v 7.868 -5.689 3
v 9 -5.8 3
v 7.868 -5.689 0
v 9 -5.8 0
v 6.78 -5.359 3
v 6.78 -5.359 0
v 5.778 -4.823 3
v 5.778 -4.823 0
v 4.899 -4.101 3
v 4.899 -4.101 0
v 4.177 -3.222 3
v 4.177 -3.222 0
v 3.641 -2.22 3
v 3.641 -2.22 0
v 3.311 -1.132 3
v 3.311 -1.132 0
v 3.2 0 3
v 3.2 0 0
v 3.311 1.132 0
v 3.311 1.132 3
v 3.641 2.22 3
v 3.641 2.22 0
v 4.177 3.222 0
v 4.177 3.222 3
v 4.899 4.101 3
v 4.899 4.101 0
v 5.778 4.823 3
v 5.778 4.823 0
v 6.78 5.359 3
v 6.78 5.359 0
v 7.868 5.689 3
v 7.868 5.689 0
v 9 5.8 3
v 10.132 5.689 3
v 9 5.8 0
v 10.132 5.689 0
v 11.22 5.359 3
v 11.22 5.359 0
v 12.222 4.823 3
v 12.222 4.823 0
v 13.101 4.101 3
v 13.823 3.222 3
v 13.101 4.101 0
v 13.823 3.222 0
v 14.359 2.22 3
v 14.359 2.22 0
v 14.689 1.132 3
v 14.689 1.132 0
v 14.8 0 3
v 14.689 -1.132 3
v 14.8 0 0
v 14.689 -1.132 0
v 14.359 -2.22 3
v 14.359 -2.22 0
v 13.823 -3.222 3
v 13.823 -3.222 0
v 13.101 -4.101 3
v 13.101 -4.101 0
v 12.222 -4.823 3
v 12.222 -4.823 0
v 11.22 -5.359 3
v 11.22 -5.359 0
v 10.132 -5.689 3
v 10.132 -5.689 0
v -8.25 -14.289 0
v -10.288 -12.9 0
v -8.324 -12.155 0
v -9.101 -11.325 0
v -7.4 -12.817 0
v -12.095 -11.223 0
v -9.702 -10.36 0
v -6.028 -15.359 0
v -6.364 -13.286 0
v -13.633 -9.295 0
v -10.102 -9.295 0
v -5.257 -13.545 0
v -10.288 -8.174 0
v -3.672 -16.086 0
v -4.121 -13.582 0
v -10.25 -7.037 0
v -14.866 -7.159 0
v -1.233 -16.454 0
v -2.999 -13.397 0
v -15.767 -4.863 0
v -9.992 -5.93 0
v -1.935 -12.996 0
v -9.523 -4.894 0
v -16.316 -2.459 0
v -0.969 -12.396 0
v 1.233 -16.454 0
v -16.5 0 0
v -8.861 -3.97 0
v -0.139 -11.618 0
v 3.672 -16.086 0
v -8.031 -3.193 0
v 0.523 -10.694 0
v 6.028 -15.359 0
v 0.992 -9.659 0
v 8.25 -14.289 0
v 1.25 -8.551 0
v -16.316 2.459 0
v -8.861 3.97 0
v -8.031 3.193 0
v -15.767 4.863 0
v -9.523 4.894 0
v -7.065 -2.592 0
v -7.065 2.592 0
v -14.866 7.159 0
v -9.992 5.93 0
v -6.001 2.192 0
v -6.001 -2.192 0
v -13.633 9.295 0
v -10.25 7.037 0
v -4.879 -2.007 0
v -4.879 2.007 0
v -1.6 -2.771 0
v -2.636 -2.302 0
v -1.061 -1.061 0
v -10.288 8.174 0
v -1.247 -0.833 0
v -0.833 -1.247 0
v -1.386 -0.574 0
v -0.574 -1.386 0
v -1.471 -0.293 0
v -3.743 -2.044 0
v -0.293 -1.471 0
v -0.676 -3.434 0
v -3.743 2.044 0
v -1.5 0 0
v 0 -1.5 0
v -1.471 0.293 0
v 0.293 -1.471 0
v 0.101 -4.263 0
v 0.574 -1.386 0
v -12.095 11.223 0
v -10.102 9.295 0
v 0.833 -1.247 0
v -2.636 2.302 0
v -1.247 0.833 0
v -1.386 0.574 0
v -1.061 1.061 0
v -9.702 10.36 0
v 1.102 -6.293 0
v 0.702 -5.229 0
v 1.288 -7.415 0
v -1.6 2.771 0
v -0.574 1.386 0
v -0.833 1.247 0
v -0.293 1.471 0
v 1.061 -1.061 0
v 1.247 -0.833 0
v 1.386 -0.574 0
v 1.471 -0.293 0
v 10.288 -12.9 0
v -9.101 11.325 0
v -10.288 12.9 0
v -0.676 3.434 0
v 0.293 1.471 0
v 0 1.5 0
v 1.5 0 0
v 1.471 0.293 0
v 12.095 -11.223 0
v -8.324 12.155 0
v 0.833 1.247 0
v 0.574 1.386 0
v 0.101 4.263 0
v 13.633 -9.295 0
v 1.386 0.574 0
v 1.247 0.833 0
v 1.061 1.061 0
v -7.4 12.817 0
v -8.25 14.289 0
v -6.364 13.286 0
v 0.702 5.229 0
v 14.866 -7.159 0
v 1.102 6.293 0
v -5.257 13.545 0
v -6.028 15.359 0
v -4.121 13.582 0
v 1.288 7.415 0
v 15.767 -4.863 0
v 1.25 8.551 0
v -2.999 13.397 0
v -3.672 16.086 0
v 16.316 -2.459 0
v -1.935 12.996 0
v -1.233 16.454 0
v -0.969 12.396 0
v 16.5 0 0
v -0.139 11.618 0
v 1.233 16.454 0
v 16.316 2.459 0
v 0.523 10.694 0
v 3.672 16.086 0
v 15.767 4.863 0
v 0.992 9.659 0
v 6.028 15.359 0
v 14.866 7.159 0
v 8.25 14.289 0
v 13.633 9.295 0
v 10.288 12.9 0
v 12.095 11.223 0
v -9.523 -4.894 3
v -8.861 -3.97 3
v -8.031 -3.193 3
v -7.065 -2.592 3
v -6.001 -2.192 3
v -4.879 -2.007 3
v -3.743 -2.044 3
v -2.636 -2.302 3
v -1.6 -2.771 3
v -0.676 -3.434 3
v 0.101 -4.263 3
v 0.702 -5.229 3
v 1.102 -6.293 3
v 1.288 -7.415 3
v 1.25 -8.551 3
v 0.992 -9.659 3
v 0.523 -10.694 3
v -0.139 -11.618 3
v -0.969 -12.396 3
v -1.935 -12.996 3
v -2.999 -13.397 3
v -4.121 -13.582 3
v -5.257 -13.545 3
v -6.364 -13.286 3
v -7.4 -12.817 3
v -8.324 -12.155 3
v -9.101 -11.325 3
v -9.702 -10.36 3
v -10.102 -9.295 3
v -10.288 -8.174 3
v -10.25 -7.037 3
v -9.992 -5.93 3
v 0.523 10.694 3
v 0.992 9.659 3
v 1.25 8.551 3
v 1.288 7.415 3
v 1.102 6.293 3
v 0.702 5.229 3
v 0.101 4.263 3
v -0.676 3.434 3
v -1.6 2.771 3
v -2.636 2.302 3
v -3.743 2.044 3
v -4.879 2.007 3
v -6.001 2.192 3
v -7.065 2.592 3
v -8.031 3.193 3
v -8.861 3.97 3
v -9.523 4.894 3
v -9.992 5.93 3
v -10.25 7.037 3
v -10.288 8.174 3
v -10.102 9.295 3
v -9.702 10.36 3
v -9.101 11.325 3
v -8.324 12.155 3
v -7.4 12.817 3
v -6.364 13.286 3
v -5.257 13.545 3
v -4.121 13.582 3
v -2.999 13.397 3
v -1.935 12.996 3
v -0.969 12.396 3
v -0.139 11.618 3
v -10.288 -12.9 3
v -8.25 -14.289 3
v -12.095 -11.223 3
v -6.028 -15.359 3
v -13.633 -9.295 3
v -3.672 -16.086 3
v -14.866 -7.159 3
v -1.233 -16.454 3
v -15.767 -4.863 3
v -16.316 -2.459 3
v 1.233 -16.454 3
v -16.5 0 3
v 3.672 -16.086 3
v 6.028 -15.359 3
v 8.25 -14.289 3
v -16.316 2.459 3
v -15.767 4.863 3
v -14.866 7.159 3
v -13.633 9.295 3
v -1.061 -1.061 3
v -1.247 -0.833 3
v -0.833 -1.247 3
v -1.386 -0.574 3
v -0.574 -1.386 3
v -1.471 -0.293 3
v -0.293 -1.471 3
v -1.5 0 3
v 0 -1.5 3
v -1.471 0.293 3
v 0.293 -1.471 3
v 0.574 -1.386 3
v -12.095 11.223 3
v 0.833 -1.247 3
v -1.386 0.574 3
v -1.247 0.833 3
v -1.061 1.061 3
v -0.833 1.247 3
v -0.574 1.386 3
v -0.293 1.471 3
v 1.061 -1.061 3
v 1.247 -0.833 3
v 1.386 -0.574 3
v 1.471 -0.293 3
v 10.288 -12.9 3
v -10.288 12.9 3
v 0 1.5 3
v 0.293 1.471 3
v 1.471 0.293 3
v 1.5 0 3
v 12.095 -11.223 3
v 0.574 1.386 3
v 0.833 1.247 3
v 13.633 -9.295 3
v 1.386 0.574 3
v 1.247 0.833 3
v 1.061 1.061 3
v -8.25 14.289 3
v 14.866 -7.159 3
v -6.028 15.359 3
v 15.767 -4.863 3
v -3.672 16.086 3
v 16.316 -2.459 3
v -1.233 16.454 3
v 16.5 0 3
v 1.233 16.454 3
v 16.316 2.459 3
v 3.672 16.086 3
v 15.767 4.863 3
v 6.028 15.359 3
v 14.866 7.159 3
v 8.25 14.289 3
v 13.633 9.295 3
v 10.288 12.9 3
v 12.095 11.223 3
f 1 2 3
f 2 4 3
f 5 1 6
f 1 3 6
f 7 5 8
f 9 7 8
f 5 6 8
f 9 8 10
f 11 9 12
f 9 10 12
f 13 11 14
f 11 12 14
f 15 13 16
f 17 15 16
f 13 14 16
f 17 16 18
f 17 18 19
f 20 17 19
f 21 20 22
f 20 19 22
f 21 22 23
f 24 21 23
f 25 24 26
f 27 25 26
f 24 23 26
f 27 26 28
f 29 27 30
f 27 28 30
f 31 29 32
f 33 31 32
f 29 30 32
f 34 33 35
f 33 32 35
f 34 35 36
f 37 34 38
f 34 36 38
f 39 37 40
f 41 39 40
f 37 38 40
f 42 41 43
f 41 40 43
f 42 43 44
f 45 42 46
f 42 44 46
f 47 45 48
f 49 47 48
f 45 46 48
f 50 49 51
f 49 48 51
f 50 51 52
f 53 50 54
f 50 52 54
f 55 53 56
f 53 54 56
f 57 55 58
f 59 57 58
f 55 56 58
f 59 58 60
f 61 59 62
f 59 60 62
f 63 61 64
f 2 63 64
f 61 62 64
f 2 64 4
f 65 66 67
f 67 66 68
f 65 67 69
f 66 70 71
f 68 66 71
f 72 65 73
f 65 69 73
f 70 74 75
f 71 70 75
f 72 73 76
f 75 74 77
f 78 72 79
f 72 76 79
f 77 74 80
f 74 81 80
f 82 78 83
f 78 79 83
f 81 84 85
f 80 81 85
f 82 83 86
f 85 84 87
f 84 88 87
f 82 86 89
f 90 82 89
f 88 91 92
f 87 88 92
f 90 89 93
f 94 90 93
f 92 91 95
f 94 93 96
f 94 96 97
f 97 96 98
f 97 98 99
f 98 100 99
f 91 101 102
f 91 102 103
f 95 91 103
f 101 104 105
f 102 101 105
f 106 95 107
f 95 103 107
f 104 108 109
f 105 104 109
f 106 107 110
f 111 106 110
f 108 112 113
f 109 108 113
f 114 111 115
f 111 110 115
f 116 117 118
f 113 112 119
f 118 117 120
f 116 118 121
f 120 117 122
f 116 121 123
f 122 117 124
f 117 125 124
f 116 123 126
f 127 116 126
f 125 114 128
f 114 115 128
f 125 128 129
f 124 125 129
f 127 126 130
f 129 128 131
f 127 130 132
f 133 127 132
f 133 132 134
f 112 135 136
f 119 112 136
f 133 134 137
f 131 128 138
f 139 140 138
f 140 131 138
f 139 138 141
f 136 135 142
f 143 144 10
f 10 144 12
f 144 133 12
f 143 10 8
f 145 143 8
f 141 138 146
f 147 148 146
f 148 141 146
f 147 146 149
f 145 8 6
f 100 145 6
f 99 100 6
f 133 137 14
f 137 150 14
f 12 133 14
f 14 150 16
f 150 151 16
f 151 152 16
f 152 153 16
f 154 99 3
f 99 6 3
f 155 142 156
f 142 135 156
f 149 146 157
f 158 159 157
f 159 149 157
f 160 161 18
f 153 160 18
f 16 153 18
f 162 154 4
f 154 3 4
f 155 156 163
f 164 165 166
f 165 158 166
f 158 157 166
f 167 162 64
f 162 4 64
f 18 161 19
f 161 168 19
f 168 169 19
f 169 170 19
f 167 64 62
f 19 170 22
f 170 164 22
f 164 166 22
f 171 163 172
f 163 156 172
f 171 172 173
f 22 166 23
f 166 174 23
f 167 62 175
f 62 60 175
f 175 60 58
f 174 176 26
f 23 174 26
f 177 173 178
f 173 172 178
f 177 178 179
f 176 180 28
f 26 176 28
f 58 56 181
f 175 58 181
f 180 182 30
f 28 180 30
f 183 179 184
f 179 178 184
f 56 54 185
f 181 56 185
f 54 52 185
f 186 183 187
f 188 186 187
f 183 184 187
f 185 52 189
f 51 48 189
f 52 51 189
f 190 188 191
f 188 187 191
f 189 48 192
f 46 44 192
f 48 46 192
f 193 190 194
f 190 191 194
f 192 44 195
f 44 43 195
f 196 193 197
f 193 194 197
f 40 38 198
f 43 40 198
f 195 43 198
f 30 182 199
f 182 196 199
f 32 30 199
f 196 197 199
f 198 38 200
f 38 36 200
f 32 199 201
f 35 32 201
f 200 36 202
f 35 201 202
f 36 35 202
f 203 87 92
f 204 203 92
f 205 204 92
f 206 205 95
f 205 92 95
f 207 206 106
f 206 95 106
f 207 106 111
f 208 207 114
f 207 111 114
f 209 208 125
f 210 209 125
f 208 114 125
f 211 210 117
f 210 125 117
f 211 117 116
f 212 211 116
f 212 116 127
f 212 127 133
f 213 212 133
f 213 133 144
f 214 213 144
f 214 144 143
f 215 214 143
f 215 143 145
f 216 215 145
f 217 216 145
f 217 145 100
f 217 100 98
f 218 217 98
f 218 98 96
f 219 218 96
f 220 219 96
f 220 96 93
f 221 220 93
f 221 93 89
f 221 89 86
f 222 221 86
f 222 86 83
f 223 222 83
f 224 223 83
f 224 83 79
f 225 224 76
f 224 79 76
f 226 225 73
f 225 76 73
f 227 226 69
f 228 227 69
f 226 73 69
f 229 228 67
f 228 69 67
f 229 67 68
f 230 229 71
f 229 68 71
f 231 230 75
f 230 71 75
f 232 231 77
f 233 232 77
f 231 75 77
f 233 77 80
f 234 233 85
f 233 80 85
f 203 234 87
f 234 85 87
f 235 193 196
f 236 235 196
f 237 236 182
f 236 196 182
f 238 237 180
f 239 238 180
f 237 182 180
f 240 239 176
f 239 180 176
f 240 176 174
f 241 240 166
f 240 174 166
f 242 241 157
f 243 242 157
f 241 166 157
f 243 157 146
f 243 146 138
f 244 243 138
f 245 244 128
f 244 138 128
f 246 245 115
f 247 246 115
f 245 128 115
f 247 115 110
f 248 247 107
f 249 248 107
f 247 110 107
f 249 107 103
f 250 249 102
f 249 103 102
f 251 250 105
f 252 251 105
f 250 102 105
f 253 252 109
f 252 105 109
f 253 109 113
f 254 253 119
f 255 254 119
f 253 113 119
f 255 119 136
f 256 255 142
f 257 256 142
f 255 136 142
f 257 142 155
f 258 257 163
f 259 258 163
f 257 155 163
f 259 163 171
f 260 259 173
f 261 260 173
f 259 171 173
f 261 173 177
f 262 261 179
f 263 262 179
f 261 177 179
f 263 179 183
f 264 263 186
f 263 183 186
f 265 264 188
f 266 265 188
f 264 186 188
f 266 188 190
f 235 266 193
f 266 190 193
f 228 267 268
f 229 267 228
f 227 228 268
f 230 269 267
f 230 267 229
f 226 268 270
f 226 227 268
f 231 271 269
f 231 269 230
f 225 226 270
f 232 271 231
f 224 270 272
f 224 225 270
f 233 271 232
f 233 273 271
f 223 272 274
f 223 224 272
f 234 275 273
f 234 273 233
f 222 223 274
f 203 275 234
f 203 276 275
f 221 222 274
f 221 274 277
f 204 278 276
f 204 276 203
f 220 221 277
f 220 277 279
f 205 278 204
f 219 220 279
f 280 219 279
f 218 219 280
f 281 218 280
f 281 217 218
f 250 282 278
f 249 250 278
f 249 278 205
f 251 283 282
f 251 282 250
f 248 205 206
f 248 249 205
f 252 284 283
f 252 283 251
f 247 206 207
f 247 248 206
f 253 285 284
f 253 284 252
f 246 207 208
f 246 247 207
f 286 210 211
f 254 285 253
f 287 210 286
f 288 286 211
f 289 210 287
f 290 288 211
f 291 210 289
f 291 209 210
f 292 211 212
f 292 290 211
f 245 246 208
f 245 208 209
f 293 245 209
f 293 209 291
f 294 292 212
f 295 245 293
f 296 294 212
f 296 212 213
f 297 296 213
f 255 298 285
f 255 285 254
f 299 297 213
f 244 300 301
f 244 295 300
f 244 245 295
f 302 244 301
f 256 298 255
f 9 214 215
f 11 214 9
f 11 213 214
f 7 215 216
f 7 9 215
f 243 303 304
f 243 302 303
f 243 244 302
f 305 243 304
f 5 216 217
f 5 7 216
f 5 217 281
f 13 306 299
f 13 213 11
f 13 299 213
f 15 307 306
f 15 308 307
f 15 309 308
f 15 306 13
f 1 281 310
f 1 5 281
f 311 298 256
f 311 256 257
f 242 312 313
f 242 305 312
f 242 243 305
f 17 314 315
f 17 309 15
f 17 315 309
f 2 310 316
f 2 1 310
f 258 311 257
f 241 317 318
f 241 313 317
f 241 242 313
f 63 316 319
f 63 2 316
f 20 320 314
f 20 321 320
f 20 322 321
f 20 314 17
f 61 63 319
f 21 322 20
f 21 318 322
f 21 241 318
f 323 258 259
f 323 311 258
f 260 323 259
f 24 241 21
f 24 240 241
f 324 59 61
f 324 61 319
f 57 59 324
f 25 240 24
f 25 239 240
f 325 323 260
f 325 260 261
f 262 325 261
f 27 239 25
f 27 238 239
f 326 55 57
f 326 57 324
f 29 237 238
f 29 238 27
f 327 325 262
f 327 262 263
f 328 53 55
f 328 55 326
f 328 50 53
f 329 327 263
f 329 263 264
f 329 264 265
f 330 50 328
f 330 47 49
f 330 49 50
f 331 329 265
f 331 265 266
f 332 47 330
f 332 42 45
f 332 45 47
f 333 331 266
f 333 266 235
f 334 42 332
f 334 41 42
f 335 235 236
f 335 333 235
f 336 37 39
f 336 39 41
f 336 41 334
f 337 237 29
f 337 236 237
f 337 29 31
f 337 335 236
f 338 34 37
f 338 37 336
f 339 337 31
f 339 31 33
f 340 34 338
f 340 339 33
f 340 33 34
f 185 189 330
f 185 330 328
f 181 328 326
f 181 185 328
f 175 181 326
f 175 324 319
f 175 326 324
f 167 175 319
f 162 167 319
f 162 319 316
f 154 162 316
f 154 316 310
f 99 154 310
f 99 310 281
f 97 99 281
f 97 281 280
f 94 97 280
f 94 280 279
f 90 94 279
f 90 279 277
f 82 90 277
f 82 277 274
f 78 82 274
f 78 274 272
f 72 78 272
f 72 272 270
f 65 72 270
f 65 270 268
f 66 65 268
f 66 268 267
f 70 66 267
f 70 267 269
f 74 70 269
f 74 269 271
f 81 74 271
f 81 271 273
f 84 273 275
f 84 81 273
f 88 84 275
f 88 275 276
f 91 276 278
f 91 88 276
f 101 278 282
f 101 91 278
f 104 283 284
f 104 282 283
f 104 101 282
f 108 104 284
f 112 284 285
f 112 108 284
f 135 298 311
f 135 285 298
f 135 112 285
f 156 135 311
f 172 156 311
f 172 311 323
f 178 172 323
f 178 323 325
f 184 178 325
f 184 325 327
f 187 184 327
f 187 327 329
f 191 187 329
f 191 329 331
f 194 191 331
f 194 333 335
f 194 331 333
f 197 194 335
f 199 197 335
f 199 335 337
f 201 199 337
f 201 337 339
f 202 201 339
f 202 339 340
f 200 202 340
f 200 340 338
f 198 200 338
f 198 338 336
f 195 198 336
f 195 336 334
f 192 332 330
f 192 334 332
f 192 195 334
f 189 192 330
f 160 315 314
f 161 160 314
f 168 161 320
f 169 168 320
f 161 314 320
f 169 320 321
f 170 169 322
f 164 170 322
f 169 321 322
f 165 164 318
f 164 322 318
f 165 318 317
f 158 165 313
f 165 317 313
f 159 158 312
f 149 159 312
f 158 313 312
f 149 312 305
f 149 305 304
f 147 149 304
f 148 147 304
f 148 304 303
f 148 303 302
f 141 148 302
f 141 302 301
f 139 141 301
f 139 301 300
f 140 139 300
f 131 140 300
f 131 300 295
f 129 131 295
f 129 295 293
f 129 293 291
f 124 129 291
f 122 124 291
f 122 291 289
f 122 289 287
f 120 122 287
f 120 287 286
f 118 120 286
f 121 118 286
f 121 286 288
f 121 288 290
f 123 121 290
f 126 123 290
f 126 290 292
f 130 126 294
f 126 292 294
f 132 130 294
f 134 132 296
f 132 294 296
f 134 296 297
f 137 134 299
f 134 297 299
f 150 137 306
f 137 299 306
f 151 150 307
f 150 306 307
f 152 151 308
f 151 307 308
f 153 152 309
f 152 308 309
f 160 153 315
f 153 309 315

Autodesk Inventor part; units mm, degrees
ref_plane "YZ Plane" through (0, 0, 0) normal (1, 0, 0) x (0, 1, 0)
ref_plane "XZ Plane" through (0, 0, 0) normal (0, 1, 0) x (-1, 0, 0)
ref_plane "XY Plane" through (0, 0, 0) normal (0, 0, 1) x (1, 0, 0)
sketch "Sketch1" plane through (0, 0, 0) normal (0, 0, 1) x (1, 0, 0)
  circle A0 centre (0, 0) radius 16.5
  dimension "d0" = 33
extrude "Extrusion1" add sketch "Sketch1" along normal blind 3
sketch "Sketch2" plane through (0, 0, 3) normal (0, 0, 1) x (1, 0, 0)
  circle A0 centre (0, 0) radius 9 construction
  point P0 (9, 0)
  dimension "d3" = 18
hole "Hole1" at (9, 0, 3) direction (0, 0, -1) diameter 11.6 end through all
pattern_circular "Circular Pattern1" count 3 over 360 about axis through (0, 0, 0) along (0, 0, 1) of "Hole1"
sketch "Sketch3" plane through (0, 0, 3) normal (0, 0, 1) x (1, 0, 0)
  circle A0 centre (0, 0) radius 1.5
  dimension "d14" = 3
extrude "Extrusion2" cut sketch "Sketch3" against normal through all
thread "Thread1" size "M3x0.5" class "6H" standard "ANSI Metric M Profile" full length
properties part number "Electrode Aligning Disk" material "Stainless Steel"
